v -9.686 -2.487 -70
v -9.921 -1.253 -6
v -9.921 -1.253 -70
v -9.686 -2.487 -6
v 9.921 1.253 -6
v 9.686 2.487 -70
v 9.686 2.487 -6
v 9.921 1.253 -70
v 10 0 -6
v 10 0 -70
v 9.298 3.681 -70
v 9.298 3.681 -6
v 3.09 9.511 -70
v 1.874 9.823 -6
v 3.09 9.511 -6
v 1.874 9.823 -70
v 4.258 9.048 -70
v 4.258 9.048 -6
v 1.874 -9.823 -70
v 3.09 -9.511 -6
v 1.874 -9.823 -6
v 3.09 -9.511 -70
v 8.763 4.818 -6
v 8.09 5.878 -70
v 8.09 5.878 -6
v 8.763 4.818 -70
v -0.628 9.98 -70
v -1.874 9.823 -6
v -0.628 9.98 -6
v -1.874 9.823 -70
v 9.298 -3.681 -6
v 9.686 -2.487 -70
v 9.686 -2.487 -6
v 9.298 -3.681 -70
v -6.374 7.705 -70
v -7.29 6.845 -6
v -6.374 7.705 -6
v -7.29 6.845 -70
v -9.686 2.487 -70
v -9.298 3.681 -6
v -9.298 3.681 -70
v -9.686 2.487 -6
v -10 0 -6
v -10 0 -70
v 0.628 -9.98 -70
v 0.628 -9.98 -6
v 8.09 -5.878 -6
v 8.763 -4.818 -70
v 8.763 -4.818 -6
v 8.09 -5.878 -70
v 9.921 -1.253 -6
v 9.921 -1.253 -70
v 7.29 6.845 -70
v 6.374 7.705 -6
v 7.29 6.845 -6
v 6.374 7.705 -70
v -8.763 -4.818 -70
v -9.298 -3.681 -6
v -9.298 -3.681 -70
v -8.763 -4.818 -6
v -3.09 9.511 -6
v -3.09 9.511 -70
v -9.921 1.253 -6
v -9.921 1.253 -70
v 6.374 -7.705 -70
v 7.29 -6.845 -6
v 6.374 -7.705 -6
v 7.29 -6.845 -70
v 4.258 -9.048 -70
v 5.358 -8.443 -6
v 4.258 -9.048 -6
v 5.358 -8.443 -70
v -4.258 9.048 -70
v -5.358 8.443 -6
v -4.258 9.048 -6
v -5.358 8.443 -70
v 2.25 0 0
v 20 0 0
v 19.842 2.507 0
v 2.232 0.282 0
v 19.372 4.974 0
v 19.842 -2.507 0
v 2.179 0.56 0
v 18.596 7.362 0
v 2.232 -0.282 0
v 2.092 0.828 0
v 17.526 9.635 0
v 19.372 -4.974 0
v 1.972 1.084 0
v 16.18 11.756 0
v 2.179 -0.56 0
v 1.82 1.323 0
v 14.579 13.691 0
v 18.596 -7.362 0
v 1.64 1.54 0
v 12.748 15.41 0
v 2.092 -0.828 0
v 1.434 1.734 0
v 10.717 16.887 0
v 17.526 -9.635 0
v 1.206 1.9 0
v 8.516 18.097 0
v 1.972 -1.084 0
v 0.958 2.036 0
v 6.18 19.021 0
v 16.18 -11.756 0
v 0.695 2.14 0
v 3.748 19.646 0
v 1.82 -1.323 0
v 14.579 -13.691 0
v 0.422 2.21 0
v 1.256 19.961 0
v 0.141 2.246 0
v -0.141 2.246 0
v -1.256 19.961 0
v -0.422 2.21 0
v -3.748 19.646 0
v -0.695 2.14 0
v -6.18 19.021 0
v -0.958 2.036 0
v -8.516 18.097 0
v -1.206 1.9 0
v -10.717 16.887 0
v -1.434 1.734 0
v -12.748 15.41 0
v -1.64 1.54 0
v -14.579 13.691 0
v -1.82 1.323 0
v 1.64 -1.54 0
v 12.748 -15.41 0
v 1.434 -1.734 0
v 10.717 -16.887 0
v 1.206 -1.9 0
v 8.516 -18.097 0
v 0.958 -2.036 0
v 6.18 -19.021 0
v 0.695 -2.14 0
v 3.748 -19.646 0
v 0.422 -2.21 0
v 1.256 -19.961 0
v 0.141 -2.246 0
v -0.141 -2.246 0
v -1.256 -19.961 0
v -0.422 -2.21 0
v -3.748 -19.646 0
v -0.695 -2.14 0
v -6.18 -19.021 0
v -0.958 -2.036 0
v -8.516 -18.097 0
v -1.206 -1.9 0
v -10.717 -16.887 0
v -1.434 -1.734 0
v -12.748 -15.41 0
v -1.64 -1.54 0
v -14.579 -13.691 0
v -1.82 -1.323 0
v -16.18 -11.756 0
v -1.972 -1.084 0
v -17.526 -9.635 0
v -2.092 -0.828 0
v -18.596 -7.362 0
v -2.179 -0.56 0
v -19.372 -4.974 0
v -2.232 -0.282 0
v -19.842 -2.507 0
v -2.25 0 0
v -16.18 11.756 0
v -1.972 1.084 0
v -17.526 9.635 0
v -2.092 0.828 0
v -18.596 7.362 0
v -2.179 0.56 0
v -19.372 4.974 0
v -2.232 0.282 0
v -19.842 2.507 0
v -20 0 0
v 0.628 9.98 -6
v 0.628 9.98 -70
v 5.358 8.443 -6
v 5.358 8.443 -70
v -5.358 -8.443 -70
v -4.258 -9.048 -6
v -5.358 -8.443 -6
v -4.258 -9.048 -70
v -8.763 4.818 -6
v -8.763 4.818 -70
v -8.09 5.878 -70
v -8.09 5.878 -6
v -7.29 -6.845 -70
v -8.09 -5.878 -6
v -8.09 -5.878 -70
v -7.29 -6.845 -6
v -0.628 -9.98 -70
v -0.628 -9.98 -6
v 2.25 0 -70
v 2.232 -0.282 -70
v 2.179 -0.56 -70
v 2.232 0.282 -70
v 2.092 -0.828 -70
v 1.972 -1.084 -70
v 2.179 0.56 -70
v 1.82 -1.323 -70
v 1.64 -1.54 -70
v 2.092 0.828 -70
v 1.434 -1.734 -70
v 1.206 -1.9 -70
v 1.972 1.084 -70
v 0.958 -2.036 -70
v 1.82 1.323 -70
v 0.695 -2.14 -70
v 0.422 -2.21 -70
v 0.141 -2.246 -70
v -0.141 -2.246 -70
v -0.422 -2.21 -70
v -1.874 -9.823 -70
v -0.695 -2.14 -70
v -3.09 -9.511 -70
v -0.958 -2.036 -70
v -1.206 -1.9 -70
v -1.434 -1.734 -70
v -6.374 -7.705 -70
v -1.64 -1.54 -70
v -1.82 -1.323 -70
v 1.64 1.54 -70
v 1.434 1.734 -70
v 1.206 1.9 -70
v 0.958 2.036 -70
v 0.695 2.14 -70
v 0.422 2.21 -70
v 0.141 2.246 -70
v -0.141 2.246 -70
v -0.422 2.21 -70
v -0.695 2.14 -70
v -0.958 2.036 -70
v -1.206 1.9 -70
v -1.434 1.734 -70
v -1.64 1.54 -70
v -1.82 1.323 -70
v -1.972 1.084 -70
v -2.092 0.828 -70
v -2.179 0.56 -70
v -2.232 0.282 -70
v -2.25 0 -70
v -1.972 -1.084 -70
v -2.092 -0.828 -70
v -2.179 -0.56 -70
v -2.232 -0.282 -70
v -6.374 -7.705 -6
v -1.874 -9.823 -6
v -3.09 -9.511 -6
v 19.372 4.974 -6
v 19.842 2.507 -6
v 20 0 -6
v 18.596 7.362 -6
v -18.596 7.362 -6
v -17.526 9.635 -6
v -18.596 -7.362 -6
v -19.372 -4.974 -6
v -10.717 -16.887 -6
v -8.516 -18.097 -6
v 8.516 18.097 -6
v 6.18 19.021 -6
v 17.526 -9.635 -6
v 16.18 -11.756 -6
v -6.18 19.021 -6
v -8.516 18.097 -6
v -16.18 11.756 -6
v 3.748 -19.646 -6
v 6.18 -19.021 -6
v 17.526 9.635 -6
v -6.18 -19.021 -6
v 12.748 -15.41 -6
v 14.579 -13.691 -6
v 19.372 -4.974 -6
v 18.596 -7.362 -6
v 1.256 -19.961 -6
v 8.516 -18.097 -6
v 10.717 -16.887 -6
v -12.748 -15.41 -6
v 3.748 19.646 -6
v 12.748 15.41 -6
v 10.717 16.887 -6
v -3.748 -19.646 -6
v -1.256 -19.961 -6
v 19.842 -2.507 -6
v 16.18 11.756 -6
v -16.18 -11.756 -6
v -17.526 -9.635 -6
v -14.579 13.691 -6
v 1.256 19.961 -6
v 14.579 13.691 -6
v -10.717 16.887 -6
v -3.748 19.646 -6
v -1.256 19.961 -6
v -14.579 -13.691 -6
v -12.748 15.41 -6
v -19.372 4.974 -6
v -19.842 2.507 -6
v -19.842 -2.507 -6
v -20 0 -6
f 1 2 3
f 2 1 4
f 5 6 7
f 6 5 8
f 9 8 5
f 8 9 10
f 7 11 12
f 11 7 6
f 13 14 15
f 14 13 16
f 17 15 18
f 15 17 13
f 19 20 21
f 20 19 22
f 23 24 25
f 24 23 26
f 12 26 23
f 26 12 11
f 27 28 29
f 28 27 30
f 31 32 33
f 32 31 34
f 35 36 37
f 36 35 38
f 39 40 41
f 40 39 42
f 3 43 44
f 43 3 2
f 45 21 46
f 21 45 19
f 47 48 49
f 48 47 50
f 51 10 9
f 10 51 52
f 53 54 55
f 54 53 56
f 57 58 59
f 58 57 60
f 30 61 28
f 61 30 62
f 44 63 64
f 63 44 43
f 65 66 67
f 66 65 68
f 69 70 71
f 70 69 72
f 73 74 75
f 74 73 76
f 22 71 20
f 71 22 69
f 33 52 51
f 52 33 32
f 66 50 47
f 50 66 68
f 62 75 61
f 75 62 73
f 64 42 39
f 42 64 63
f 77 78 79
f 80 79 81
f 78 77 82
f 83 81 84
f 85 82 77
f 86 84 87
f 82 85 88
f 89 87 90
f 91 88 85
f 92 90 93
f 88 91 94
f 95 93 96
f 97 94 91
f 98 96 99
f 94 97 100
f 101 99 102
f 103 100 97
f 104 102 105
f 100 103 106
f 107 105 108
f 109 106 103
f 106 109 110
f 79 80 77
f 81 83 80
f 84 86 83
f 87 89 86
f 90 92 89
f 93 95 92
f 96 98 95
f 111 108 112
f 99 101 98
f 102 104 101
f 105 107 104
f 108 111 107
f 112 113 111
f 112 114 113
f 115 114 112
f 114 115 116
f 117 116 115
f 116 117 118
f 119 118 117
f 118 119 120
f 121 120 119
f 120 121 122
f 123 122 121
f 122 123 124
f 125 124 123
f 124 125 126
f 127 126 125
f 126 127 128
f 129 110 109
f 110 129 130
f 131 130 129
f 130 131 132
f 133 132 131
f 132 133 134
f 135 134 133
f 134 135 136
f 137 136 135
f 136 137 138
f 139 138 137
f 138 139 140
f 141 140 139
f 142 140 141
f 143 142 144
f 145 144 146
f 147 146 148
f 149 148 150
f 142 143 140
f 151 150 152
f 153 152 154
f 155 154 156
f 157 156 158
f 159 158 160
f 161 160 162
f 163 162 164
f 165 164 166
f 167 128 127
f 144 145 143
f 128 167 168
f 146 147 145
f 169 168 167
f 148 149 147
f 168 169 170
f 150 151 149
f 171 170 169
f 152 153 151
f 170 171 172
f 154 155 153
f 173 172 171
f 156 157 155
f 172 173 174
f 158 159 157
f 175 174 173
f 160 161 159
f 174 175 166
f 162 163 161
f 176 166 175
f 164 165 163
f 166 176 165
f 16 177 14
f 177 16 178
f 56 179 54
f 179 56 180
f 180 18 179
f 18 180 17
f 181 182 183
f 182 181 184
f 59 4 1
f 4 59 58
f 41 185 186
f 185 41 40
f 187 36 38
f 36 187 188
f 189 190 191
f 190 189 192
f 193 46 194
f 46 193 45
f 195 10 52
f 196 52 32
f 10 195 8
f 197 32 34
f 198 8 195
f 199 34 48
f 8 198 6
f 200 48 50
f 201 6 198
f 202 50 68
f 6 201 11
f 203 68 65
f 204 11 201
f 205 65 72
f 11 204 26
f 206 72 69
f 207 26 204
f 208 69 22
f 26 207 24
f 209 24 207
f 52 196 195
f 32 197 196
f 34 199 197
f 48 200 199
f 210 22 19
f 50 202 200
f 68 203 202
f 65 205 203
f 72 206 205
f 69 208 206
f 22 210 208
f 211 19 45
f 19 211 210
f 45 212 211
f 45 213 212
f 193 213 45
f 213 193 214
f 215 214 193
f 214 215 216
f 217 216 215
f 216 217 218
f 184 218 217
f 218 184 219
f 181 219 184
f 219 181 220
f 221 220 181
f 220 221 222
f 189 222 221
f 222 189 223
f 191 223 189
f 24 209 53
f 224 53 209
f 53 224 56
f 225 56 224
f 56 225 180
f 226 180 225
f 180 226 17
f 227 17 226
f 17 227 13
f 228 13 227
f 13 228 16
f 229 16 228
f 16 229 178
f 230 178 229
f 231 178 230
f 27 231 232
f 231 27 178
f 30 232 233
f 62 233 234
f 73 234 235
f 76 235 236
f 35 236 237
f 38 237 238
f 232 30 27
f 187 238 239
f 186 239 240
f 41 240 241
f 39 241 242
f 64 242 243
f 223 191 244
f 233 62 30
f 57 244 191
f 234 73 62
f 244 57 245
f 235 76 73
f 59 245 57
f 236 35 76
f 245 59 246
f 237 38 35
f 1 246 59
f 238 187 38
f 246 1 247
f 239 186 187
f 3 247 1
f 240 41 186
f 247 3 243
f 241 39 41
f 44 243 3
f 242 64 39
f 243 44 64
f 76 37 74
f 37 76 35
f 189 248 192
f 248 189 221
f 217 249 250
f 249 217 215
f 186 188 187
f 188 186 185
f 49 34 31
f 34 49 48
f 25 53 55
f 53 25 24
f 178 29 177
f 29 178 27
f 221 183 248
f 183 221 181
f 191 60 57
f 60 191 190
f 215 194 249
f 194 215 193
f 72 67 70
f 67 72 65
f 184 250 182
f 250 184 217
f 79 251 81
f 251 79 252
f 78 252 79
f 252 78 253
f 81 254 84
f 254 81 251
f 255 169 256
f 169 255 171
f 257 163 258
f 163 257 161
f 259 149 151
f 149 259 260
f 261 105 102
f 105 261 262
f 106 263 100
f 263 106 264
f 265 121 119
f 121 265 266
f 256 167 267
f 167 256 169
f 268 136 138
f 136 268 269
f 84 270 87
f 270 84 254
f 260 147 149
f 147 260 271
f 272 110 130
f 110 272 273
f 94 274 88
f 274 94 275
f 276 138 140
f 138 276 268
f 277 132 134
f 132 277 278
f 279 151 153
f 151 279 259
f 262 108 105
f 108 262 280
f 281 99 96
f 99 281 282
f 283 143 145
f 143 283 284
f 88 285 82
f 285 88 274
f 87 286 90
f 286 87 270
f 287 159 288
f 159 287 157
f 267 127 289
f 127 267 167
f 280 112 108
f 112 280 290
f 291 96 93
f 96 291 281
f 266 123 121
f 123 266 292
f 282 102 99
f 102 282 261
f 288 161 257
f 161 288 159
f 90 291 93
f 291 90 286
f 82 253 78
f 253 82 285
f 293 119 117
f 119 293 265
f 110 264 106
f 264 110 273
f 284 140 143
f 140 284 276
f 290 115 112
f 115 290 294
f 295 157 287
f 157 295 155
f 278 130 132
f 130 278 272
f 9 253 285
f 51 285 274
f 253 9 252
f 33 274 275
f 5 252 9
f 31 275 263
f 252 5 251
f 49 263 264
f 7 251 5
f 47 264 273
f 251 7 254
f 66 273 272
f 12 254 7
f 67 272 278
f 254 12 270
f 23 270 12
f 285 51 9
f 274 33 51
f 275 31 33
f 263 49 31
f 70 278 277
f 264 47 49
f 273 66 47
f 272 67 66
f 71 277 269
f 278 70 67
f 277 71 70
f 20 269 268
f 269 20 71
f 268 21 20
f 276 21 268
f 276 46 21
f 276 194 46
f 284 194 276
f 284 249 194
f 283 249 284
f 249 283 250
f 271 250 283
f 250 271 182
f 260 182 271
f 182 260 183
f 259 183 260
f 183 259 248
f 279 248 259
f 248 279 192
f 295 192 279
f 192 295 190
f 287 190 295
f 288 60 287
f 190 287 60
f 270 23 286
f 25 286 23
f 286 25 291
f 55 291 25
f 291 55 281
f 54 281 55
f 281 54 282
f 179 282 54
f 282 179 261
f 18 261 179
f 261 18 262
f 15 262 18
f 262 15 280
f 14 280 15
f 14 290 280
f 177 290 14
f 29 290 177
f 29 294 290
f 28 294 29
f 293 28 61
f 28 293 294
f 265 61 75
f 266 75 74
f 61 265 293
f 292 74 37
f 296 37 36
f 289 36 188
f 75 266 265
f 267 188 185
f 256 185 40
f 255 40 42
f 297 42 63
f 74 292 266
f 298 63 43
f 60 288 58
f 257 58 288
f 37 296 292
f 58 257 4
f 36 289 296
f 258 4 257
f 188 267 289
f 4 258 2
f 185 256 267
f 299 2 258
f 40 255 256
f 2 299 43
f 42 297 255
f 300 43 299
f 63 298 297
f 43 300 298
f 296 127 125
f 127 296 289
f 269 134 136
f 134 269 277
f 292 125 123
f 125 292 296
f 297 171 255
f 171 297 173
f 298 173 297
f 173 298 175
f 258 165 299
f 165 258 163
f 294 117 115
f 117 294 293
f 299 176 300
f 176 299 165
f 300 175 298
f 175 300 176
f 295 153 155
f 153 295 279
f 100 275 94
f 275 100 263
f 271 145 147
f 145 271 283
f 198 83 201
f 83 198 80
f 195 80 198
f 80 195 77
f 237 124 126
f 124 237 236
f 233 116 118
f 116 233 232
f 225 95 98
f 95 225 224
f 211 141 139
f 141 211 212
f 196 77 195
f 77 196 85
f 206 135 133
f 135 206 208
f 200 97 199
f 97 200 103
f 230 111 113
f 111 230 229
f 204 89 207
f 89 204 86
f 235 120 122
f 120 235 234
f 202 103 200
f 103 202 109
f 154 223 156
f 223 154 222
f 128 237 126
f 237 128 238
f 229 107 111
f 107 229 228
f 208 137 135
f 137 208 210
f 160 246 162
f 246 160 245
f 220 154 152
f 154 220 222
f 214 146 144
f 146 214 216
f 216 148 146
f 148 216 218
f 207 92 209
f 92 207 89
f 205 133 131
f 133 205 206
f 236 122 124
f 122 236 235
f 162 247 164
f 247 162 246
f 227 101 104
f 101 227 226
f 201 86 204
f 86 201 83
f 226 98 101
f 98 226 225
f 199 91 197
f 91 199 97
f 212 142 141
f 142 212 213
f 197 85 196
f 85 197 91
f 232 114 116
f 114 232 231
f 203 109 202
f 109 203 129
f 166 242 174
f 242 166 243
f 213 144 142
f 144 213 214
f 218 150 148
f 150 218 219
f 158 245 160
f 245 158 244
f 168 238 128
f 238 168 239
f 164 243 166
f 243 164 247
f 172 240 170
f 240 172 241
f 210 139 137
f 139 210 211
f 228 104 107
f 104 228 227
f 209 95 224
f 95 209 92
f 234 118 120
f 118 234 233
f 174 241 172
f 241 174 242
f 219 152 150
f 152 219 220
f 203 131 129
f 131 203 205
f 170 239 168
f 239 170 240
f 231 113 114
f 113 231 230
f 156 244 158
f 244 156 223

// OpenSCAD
$fn = 50;


difference() {
	union() {
		translate(v = [0, 0, -70.0000000000]) {
			cylinder(h = 70, r = 10.0000000000);
		}
		translate(v = [0, 0, -6.0000000000]) {
			cylinder(h = 6, r = 20.0000000000);
		}
	}
	union() {
		#translate(v = [0, 0, -70]) {
			cylinder(h = 70, r = 2.2500000000);
		}
	}
}
